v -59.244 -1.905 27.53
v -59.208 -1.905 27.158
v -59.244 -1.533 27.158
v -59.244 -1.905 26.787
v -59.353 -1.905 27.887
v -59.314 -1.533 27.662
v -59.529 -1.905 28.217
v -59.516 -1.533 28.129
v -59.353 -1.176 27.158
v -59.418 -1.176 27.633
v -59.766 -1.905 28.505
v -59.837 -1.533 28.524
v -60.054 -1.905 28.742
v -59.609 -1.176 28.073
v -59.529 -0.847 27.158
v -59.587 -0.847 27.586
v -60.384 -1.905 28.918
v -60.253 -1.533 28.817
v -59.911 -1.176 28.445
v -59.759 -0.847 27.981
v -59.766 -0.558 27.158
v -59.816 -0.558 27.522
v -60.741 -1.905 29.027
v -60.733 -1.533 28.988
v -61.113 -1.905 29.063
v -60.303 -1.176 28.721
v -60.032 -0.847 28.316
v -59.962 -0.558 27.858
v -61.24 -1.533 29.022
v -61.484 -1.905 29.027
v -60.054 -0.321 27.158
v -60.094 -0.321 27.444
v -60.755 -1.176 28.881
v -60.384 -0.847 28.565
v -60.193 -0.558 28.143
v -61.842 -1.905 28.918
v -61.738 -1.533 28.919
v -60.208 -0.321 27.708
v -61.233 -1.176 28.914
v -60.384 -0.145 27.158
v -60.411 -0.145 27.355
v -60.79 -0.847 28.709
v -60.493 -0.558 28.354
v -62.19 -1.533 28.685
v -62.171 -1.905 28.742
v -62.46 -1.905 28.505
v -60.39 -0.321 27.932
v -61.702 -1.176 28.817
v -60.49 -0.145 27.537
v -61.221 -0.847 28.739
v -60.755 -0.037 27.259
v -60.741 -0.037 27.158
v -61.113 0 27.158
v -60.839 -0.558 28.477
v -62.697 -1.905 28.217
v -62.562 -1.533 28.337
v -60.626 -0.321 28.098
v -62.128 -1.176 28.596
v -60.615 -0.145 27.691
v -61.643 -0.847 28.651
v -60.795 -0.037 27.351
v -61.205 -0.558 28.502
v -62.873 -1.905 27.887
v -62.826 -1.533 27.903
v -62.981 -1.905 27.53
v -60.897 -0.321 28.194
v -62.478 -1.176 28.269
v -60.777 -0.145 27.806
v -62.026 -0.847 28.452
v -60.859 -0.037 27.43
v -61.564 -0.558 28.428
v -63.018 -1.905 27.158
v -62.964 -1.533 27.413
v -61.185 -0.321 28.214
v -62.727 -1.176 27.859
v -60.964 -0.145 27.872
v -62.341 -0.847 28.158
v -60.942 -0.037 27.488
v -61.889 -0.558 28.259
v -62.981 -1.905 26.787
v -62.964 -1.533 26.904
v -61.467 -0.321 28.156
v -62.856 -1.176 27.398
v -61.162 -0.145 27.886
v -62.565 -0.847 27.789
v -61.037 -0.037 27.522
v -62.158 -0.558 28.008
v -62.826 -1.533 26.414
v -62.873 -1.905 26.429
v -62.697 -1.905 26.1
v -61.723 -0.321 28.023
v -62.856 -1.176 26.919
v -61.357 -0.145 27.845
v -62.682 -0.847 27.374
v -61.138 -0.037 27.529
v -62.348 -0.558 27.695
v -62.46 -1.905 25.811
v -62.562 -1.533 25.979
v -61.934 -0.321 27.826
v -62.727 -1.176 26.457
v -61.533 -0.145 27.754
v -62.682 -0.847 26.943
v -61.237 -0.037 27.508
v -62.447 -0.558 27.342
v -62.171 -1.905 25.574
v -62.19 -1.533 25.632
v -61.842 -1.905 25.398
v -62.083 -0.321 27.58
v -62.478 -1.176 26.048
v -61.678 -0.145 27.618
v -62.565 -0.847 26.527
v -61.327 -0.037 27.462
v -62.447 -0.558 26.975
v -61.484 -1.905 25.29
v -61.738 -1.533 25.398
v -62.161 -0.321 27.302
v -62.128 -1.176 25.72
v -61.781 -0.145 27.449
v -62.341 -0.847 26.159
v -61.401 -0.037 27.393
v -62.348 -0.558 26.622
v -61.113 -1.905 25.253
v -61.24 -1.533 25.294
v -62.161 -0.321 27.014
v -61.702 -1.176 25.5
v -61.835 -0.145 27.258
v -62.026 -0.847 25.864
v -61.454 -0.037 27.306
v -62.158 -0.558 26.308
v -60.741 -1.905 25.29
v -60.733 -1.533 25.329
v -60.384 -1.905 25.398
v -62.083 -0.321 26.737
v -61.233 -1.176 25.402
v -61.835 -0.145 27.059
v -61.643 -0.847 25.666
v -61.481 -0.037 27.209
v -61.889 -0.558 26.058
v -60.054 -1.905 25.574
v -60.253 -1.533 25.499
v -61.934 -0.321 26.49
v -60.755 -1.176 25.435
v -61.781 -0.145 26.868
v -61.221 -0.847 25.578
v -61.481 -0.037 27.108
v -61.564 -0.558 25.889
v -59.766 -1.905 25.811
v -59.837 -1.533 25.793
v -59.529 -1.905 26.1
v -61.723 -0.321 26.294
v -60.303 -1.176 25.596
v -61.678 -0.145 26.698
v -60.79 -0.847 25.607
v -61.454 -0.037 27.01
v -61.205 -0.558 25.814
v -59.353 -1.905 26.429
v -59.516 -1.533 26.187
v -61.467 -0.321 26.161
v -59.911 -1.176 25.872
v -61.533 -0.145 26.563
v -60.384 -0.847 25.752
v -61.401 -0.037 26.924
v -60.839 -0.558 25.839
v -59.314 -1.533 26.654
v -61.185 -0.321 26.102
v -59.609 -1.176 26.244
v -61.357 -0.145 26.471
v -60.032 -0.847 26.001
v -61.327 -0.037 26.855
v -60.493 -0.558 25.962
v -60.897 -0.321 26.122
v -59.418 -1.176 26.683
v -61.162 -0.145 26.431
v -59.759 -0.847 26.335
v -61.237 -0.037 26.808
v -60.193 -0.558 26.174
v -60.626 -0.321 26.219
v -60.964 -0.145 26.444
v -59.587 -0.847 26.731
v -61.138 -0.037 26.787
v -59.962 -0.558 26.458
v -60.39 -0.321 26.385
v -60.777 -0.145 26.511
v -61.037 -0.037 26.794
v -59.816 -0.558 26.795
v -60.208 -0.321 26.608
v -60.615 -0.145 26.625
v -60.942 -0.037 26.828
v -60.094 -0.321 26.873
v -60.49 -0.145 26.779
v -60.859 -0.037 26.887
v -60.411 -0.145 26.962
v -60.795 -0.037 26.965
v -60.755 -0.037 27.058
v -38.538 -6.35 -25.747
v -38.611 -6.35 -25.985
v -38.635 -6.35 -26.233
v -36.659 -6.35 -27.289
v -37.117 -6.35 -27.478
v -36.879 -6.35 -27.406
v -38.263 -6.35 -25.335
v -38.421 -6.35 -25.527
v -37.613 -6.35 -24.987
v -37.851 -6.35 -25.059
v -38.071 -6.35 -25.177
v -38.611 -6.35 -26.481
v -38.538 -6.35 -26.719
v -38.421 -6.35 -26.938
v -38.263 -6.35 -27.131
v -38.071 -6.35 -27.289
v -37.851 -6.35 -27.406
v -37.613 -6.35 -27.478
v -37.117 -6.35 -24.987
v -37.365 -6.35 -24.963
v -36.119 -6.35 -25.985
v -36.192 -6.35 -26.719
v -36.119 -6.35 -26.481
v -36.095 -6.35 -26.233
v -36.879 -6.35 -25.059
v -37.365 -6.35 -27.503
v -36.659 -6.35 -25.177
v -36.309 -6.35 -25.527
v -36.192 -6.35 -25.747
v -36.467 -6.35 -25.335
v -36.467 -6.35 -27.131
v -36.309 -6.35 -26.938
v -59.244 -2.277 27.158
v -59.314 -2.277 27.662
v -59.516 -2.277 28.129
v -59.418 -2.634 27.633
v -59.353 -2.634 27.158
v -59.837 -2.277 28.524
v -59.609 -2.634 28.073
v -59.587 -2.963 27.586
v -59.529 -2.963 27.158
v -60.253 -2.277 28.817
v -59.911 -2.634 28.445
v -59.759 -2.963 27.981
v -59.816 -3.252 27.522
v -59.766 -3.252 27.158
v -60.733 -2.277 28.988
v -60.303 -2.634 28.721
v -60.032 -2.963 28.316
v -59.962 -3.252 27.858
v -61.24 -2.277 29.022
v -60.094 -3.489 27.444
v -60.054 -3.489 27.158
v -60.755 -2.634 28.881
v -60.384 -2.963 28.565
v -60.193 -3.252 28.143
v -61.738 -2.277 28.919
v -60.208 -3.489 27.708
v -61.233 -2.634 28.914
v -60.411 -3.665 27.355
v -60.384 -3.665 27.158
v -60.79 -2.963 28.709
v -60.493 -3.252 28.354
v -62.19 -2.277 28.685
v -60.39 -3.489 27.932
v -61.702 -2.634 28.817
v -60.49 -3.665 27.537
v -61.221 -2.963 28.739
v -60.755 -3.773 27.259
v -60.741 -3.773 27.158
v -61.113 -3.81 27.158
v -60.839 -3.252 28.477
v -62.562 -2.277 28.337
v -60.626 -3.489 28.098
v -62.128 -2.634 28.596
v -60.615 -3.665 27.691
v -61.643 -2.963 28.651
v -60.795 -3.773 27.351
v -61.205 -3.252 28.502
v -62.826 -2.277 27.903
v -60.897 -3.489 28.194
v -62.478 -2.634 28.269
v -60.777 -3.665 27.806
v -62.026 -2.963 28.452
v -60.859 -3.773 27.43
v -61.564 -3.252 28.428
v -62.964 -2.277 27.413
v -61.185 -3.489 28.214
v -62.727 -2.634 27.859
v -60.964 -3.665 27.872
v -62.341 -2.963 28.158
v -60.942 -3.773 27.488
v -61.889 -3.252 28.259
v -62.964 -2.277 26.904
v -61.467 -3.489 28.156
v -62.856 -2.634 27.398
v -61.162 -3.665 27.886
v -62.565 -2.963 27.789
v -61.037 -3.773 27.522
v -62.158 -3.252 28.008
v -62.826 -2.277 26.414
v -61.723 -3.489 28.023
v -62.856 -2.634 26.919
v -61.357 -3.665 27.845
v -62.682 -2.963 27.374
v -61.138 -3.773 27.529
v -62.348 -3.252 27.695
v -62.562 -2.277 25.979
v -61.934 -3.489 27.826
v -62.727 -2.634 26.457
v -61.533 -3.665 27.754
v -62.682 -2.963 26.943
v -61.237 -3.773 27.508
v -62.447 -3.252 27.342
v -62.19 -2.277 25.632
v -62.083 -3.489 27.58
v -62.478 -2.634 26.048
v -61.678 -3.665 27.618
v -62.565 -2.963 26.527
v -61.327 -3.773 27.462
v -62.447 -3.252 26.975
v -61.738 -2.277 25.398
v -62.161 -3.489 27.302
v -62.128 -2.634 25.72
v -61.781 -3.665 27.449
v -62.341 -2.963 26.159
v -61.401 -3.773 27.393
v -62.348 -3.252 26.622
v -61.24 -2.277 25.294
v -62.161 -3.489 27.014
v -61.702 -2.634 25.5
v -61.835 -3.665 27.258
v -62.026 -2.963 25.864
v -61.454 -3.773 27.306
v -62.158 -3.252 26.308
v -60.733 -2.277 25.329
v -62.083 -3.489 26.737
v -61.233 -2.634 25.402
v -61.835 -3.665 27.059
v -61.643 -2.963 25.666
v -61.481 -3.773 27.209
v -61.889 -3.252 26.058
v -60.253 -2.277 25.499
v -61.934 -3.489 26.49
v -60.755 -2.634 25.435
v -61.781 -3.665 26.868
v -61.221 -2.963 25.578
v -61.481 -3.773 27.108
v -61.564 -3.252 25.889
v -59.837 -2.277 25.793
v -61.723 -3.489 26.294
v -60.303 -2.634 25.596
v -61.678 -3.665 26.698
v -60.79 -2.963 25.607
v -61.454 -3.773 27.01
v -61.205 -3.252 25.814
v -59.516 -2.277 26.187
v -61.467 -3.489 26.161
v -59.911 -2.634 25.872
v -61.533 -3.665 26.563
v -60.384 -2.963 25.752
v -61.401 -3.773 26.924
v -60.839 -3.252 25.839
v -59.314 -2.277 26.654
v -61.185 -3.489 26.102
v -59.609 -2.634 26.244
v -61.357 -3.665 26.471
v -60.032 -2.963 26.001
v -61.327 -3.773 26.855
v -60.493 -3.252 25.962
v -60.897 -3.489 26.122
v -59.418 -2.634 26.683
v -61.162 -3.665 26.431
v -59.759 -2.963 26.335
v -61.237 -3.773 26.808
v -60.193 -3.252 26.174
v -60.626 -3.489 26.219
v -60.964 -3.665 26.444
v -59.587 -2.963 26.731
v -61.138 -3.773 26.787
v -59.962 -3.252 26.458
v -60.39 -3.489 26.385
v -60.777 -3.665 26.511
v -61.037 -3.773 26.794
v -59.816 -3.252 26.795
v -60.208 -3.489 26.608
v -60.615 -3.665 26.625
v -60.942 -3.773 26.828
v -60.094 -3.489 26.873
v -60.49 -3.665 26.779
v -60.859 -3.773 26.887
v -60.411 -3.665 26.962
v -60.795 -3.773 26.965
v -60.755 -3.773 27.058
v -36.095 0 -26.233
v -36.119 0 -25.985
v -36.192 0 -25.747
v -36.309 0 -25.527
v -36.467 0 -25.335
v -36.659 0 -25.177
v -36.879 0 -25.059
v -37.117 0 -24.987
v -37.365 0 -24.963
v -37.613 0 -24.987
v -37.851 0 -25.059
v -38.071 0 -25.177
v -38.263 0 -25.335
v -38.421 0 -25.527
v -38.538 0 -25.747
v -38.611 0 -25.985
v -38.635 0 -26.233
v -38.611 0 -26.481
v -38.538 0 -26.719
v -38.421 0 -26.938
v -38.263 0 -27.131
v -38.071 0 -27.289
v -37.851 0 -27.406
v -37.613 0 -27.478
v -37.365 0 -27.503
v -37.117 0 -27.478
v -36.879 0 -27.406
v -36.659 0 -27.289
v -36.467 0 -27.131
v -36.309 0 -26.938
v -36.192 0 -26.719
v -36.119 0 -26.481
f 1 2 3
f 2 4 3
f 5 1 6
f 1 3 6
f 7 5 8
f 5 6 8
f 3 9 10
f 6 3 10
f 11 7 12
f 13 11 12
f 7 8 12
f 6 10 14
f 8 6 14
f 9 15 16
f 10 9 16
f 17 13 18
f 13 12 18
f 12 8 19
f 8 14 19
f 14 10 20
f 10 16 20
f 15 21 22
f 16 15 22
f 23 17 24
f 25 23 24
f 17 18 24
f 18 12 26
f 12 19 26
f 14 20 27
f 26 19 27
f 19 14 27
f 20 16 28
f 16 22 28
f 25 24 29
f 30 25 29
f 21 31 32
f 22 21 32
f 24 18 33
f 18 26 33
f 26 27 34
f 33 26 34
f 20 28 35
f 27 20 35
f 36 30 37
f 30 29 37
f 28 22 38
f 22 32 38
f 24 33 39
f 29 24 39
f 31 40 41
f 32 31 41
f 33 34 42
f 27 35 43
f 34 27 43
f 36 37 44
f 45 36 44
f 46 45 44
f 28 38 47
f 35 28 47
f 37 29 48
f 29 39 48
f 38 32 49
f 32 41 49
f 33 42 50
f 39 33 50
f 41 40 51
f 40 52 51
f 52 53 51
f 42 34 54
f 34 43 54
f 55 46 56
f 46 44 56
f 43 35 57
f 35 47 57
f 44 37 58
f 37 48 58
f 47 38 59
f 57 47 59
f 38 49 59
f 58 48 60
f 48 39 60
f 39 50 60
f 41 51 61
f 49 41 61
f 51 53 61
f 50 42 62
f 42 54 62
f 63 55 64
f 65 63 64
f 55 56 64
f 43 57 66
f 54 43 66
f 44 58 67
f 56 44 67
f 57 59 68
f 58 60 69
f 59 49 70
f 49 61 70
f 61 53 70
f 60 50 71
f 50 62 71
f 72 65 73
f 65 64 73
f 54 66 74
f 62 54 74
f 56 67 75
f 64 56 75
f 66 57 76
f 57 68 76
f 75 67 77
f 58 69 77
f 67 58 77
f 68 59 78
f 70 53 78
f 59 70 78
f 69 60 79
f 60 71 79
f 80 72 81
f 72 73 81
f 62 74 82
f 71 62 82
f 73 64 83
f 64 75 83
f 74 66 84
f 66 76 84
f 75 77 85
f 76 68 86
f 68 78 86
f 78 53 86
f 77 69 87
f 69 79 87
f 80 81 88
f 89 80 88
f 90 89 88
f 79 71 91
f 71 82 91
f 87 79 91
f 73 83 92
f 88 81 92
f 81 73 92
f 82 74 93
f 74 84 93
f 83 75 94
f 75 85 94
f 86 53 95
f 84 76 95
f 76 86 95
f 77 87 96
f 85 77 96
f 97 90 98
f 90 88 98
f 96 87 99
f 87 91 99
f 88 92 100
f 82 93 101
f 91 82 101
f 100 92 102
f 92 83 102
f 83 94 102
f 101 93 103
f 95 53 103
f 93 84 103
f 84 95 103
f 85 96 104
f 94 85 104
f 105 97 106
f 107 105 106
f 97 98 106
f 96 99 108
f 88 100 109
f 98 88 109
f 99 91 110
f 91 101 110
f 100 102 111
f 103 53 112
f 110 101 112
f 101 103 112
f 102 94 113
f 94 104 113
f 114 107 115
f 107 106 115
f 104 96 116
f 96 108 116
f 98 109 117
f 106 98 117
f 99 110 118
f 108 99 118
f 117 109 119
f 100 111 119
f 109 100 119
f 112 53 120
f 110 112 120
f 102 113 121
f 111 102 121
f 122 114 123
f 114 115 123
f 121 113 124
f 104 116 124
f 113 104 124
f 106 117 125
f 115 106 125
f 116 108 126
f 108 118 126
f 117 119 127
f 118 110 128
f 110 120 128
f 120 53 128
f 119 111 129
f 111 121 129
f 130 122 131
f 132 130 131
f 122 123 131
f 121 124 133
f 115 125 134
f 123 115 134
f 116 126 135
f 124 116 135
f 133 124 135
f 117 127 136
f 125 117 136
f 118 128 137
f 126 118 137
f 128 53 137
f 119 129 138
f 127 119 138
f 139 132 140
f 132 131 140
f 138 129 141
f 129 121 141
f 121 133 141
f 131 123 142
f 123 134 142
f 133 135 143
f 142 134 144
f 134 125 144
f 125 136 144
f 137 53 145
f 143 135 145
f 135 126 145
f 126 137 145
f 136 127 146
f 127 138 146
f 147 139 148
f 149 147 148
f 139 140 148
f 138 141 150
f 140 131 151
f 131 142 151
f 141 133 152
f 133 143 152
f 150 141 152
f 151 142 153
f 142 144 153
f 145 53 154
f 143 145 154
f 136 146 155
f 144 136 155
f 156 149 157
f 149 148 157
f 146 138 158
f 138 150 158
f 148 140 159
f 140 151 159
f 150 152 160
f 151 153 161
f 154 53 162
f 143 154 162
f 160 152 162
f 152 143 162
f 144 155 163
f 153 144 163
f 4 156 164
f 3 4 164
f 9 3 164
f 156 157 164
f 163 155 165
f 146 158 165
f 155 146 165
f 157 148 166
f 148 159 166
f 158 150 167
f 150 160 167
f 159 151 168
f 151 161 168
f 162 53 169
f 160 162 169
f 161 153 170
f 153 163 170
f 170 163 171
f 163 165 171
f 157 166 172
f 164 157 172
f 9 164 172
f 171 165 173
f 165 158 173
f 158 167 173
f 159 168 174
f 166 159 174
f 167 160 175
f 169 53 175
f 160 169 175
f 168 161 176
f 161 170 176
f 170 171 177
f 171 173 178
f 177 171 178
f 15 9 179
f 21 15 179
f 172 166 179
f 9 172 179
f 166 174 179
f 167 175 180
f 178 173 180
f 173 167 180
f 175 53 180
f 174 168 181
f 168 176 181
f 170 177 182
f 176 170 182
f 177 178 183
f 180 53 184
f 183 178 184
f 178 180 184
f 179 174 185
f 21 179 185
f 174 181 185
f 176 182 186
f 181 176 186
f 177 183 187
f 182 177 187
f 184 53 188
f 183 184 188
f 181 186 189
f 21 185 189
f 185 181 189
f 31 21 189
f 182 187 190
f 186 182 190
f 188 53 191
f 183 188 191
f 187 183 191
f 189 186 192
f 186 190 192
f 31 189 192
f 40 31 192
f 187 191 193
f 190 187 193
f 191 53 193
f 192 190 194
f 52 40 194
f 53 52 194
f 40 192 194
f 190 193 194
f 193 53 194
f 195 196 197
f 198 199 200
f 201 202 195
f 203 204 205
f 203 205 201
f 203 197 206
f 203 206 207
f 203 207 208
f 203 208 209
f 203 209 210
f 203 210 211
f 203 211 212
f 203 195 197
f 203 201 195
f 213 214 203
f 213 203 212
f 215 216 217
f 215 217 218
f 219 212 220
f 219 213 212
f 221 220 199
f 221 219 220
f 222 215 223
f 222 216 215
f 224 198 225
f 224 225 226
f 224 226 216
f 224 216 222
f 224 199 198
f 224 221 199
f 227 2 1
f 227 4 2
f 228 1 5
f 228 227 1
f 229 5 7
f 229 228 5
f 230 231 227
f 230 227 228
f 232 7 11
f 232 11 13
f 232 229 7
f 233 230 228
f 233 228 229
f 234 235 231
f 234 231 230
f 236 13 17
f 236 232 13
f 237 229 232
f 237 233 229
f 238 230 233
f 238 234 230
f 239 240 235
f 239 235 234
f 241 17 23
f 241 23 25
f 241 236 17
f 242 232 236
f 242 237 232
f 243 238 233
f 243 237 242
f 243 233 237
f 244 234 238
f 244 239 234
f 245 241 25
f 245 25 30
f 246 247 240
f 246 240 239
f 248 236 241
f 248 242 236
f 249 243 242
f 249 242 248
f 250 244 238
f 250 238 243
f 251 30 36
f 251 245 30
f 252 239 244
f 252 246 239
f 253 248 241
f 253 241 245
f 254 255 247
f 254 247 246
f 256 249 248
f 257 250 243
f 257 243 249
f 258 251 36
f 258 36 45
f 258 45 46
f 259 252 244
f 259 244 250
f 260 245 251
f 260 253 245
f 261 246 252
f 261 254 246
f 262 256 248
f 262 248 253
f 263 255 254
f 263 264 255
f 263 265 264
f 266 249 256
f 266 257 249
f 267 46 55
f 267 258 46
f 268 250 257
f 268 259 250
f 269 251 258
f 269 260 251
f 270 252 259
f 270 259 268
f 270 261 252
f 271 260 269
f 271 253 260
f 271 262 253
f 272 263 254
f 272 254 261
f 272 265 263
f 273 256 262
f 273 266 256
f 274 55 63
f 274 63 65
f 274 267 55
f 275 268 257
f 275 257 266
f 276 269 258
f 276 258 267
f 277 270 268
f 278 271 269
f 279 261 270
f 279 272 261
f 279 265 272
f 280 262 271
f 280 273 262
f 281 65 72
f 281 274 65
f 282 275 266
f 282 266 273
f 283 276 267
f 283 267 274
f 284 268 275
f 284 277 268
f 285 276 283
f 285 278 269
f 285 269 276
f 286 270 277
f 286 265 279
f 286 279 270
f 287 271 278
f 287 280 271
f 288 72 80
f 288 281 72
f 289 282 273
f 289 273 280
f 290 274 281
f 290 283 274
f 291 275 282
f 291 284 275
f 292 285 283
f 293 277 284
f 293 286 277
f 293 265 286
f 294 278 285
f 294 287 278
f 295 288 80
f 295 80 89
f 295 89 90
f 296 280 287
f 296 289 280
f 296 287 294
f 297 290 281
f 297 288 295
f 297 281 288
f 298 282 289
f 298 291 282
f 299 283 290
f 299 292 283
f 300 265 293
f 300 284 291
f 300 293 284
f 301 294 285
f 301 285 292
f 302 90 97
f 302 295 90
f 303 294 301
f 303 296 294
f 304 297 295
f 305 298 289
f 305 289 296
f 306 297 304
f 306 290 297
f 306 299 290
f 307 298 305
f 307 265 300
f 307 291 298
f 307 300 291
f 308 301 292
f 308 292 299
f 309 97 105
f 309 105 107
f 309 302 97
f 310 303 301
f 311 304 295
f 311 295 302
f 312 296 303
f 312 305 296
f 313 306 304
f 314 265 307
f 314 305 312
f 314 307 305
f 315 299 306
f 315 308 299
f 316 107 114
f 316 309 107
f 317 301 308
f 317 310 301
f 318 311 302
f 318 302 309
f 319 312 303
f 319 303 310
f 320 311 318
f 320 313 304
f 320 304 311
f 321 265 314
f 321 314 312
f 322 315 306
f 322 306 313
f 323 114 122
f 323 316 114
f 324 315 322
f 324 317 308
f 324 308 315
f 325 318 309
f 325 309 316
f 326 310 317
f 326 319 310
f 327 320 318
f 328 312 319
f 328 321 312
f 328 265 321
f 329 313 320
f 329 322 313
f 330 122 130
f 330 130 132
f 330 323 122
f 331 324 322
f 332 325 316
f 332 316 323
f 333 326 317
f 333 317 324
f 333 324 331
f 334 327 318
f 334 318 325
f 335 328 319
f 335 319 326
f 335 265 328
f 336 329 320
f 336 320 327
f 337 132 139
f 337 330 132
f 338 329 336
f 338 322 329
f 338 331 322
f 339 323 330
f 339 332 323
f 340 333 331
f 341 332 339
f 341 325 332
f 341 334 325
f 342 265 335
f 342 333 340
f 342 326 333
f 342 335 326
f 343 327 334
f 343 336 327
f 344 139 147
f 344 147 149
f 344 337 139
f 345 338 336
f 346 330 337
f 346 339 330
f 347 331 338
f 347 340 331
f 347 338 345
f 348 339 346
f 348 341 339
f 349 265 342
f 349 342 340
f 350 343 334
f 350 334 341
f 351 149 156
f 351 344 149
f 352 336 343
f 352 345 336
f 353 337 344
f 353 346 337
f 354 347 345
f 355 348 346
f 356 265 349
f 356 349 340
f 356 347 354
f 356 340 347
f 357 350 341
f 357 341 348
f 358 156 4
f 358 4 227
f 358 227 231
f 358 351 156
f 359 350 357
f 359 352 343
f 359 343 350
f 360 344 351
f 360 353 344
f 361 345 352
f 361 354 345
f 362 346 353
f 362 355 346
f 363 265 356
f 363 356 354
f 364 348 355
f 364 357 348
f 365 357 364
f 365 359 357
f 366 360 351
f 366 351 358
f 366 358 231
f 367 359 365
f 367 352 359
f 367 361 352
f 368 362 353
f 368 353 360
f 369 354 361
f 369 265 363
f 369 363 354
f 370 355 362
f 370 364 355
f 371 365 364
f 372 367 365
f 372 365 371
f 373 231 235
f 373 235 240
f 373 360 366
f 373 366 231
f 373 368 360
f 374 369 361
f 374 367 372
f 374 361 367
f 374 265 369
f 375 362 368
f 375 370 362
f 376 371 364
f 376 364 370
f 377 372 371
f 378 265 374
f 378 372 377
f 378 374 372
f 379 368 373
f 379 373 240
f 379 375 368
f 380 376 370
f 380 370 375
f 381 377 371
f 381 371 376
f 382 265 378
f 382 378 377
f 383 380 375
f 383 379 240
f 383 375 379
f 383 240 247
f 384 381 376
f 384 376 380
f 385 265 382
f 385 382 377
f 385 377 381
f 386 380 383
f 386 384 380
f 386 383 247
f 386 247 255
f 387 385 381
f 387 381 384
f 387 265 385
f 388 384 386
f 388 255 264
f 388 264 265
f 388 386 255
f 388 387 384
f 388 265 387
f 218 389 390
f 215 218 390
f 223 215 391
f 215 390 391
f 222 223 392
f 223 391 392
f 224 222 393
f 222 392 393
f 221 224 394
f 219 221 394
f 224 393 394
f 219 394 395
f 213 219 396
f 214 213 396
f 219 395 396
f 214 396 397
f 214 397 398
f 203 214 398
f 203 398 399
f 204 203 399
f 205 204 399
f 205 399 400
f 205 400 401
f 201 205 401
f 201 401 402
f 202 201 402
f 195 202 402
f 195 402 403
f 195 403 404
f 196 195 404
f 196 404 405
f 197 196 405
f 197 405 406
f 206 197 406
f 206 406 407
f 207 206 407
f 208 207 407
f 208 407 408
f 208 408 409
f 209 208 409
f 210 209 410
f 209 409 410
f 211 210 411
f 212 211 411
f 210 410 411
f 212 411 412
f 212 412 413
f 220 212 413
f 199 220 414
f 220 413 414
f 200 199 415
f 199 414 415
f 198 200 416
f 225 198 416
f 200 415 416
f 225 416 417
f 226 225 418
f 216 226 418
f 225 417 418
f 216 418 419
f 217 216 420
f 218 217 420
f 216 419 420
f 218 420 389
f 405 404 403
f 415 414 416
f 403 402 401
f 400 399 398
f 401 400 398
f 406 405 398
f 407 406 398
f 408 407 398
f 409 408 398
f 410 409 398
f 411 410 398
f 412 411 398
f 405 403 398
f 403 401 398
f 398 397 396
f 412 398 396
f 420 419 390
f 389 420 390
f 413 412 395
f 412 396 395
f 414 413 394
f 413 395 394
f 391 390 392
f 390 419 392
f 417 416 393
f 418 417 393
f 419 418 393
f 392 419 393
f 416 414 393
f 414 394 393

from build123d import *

# Parameters (mm, degrees)
F0_R     = 1.27
F1_DEPTH = 6.35
F2_DEPTH = 3.81
F0_R_2   = 1.905
F3_R     = 1.90499


# Not quite as in the source:
# - a fillet or chamfer is up to 0.001 mm smaller than in the source, because OpenCascade refuses the exact size


with BuildPart() as f1:
    # F0 (on Front) → F1 (new body)
    with BuildSketch(Plane.XZ):
        with Locations((-37.3650640249, -26.2328255922)):
            Circle(F0_R)
    extrude(amount=F1_DEPTH)

    # F0 (on Front) → F2 (join)
    with BuildSketch(Plane.XZ):
        with Locations((-37.3650640249, -26.2328255922)):
            Circle(F0_R)
    extrude(amount=F2_DEPTH)


with BuildPart() as f2:
    # F0 (on Front) → F2, piece 2 (new body)
    with BuildSketch(Plane.XZ):
        with Locations((-61.1126385629, 27.1582473069)):
            Circle(F0_R_2)
    extrude(amount=F2_DEPTH)

    # F3 (radius 1.905 in the source; OpenCascade refuses exactly that, so slightly less here)
    f3_edges = [f2.edges().sort_by_distance(p)[0] for p in [
        (-63.017639, 0, 27.158247),
        (-63.017639, -3.81, 27.158247),
    ]]
    fillet(f3_edges, radius=F3_R)


solid = Compound([f1.part, f2.part])
